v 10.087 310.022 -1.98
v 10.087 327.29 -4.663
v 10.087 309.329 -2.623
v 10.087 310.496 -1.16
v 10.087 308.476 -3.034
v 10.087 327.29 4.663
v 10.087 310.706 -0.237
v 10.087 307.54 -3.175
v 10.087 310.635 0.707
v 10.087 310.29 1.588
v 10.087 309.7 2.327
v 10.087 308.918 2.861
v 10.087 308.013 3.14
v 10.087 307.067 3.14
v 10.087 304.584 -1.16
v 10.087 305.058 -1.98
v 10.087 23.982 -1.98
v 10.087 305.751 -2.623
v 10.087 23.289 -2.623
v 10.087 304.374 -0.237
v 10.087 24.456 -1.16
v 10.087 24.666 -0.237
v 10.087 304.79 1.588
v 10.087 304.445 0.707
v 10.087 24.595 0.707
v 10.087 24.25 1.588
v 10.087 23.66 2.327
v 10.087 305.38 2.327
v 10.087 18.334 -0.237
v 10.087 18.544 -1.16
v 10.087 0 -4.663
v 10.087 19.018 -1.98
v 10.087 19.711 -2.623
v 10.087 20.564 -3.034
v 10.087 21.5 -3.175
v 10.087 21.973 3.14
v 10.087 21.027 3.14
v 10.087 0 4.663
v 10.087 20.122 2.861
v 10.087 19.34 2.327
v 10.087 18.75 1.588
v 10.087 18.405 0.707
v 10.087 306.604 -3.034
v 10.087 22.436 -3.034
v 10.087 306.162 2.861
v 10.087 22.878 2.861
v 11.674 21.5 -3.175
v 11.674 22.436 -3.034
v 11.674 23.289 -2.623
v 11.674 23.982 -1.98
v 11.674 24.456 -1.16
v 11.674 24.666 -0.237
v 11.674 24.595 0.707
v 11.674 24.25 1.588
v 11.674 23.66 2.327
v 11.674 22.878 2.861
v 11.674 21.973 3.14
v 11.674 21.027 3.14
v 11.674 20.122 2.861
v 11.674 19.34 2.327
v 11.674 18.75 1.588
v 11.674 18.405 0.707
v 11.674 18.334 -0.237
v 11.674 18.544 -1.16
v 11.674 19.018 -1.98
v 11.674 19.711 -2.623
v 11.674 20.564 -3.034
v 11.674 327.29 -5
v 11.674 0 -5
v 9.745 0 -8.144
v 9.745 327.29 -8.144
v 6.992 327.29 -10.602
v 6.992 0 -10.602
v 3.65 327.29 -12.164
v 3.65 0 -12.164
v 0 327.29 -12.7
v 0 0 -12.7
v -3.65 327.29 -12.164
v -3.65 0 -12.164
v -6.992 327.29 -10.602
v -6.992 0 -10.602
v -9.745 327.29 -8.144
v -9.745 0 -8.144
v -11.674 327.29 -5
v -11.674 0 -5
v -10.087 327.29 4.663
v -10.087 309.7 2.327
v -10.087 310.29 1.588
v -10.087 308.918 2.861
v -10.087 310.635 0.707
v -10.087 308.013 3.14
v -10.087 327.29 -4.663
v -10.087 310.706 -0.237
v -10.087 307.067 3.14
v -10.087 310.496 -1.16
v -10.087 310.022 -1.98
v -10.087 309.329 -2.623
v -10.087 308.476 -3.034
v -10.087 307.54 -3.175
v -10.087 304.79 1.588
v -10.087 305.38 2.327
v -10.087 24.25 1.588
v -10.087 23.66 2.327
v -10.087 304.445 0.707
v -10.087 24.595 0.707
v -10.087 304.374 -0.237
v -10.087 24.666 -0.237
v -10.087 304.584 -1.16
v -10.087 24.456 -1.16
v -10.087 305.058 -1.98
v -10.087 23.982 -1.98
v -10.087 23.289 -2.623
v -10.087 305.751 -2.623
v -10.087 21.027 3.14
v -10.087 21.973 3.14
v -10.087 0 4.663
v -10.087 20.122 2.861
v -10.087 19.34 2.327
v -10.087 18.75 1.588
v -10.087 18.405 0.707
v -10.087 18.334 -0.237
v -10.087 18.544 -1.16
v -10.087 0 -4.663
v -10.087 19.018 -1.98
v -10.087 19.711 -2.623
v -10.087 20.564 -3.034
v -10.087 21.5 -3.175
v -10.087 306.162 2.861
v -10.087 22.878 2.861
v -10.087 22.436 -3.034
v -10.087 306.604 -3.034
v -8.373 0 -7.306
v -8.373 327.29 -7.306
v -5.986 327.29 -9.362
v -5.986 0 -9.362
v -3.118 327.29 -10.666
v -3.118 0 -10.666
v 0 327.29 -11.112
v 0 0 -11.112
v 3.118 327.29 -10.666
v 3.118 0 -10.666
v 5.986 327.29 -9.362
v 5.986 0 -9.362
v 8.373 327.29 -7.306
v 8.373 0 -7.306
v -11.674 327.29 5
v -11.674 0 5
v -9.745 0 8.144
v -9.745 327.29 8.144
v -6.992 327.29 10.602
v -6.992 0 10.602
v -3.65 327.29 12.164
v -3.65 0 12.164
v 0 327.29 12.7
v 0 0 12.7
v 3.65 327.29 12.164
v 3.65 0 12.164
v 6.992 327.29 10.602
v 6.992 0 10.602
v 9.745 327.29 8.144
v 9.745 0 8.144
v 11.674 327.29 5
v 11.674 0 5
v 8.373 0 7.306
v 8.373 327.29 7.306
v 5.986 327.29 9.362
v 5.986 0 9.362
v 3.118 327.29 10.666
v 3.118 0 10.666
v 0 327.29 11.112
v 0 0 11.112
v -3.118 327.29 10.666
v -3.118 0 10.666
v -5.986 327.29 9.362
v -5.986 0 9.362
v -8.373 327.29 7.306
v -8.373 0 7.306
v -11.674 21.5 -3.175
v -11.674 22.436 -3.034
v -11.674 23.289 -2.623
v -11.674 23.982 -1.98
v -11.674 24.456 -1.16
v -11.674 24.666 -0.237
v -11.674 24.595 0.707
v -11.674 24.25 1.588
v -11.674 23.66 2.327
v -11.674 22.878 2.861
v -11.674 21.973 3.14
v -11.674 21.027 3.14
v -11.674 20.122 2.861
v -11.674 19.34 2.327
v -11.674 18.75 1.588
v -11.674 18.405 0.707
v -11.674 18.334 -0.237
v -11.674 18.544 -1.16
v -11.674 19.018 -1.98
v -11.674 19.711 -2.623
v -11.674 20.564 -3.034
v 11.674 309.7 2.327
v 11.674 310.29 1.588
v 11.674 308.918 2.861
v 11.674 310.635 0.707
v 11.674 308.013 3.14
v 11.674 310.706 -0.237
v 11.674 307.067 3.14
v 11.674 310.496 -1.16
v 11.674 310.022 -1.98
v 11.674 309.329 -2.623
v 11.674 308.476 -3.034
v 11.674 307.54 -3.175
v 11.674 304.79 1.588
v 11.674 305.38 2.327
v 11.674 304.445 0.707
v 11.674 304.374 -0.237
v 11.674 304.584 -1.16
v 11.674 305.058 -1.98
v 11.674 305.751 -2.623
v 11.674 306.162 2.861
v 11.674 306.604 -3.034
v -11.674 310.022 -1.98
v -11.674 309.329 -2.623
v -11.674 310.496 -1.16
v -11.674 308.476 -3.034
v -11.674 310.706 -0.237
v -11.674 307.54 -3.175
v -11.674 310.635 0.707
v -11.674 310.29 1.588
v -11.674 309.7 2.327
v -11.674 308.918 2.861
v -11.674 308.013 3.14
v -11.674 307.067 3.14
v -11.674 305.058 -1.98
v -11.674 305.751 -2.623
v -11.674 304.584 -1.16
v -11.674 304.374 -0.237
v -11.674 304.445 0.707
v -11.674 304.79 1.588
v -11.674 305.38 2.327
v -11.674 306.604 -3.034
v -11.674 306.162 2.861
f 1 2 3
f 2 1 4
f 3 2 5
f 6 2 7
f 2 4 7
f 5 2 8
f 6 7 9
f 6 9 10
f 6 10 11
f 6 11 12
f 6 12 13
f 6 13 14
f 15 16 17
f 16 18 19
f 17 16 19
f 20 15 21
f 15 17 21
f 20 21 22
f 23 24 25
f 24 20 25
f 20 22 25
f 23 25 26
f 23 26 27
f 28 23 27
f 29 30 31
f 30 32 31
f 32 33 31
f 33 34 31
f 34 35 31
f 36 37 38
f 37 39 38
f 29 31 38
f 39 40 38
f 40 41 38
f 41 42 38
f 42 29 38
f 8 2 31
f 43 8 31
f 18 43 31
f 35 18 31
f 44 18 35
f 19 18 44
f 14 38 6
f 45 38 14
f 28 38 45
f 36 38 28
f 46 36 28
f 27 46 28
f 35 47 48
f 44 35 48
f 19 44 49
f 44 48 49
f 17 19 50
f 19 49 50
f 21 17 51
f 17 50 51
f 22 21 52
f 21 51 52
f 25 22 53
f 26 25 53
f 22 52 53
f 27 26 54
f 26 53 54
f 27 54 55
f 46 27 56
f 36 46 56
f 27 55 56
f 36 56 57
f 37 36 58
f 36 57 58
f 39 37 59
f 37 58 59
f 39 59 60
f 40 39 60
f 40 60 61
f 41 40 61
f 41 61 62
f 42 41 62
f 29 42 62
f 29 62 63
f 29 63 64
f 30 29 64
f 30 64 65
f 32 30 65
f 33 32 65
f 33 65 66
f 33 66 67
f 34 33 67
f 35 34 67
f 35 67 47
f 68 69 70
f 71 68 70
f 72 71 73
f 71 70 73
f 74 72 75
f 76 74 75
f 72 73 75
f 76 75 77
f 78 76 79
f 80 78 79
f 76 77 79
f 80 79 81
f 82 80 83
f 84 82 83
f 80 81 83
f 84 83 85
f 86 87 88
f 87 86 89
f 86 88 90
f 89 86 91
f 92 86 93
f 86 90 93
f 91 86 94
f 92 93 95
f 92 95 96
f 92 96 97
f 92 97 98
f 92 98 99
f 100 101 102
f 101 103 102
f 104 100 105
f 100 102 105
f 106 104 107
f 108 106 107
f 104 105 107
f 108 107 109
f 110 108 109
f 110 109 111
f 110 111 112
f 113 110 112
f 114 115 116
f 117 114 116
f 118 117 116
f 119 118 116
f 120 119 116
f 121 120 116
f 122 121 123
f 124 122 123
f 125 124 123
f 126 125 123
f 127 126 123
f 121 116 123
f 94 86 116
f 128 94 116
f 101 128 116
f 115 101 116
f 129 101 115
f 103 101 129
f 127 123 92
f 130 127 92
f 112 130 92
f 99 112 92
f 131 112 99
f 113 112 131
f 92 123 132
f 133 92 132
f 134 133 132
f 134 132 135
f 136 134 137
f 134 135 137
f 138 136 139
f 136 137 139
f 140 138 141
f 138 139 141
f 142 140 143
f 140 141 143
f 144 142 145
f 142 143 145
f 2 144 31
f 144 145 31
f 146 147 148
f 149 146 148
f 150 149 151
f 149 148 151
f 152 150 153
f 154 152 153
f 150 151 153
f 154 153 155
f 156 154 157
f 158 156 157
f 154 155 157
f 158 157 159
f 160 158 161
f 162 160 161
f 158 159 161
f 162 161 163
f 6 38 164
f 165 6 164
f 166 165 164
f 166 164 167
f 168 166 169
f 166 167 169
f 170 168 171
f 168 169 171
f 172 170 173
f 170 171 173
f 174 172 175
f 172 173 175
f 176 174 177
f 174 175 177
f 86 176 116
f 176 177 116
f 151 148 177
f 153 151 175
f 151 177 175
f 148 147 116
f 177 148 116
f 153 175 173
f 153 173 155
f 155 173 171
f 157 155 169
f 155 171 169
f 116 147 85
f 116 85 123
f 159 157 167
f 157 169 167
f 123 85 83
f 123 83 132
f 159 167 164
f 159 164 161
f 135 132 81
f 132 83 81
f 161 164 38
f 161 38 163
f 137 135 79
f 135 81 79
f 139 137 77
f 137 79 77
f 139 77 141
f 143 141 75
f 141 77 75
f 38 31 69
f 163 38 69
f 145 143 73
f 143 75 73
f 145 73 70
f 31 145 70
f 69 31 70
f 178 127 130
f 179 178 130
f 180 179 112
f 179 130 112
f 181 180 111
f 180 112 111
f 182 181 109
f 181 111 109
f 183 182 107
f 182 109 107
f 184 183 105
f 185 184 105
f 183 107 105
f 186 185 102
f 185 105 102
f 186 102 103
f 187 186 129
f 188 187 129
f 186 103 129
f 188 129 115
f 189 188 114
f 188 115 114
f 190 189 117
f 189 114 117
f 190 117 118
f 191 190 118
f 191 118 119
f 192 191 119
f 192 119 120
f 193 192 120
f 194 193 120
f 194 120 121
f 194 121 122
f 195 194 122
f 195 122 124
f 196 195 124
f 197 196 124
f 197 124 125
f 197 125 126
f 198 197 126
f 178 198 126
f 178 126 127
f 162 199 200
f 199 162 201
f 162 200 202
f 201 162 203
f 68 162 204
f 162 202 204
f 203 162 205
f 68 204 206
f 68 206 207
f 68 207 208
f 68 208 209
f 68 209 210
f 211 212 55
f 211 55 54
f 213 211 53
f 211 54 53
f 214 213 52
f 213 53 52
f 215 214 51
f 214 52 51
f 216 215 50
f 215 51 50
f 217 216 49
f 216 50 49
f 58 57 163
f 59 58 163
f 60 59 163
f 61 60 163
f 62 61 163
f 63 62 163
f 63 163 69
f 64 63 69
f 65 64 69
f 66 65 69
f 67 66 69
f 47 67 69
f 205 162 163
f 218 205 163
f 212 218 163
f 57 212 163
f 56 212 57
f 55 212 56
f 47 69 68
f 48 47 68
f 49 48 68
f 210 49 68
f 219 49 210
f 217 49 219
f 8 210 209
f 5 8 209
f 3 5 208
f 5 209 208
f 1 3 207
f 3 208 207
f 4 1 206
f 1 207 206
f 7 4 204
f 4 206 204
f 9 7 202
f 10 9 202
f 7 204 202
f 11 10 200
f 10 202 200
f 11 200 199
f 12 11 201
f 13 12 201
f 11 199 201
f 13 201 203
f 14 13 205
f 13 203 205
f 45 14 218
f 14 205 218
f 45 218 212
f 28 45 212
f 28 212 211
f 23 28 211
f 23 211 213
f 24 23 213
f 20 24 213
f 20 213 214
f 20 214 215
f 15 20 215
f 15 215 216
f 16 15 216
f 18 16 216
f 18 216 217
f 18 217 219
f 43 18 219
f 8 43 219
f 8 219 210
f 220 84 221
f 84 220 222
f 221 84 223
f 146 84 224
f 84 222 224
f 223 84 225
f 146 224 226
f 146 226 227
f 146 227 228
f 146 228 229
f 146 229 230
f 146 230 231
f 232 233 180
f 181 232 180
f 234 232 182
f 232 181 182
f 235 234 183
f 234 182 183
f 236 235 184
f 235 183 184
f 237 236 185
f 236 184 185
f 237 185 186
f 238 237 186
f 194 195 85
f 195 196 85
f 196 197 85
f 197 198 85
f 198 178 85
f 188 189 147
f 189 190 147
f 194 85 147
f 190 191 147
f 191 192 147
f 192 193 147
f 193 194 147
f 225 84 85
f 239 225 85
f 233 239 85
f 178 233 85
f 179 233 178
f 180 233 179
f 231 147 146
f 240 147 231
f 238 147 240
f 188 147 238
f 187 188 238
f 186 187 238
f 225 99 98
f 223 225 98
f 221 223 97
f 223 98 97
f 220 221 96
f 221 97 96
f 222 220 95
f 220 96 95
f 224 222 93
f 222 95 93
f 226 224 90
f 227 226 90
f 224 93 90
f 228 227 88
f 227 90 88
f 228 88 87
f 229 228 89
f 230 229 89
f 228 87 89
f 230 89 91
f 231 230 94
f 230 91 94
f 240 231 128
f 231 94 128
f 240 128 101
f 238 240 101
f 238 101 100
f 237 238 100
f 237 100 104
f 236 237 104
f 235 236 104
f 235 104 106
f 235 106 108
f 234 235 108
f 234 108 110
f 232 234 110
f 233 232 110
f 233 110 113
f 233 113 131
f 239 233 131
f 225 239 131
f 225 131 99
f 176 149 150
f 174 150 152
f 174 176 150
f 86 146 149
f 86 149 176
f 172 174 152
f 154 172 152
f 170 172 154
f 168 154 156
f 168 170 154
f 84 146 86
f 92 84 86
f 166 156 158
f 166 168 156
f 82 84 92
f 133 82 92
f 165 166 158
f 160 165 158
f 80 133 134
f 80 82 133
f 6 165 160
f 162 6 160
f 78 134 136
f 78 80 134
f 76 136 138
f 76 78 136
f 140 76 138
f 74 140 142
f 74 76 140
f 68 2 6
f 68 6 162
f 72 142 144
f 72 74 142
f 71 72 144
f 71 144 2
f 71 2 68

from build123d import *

# Parameters (mm, degrees)
BOSS_EXTRUDE1_DEPTH = 327.29
CUT_EXTRUDE1_REACH  = 330.367
SKETCH2_R           = 3.175


with BuildPart() as part:
    # Sketch1 → Boss-Extrude1 (new body)
    with BuildSketch(Plane(origin=(0, 0, 0), x_dir=(1, 0, 0), z_dir=(0, 1, 0))):
        with BuildLine():
            Line((11.674330816, -5), (11.674330816, 5))
            ThreePointArc((11.674330816, 5), (0, 12.7), (-11.674330816, 5))
            Line((-11.674330816, 5), (-11.674330816, -5))
            ThreePointArc((-11.674330816, -5), (0, -12.7), (11.674330816, -5))
        make_face()
        with BuildLine():
            Line((10.086830816, 4.662992638), (10.086830816, -4.662992638))
            ThreePointArc((10.086830816, -4.662992638), (0, -11.1125), (-10.086830816, -4.662992638))
            Line((-10.086830816, -4.662992638), (-10.086830816, 4.662992638))
            ThreePointArc((-10.086830816, 4.662992638), (0, 11.1125), (10.086830816, 4.662992638))
        make_face(mode=Mode.SUBTRACT)
    extrude(amount=BOSS_EXTRUDE1_DEPTH)

    # Cut-Extrude1: up to this face of the body (flat: up to its plane)
    cut_extrude1_end = Plane(part.part.faces().sort_by_distance((-11.674330816, 163.645, 0))[0])
    # Sketch2 → Cut-Extrude1 (cut, up to the picked face)
    with BuildSketch(Plane(origin=(11.674330816, 0, 0), x_dir=(0, 0, -1), z_dir=(1, 0, 0)), mode=Mode.PRIVATE) as cut_extrude1_sk1:
        with Locations((0, 21.5)):
            Circle(SKETCH2_R)
    cut_extrude1_tool1 = split(extrude(cut_extrude1_sk1.sketch, amount=-CUT_EXTRUDE1_REACH, mode=Mode.PRIVATE), bisect_by=cut_extrude1_end, keep=Keep.BOTH, mode=Mode.PRIVATE)
    # Sketch2 → Cut-Extrude1 (cut, up to the picked face)
    with BuildSketch(Plane(origin=(11.674330816, 0, 0), x_dir=(0, 0, -1), z_dir=(1, 0, 0)), mode=Mode.PRIVATE) as cut_extrude1_sk2:
        with Locations((0, 307.54)):
            Circle(SKETCH2_R)
    cut_extrude1_tool2 = split(extrude(cut_extrude1_sk2.sketch, amount=-CUT_EXTRUDE1_REACH, mode=Mode.PRIVATE), bisect_by=cut_extrude1_end, keep=Keep.BOTH, mode=Mode.PRIVATE)
    add(cut_extrude1_tool1.solids().sort_by(Axis((11.674331, 21.5, 0), (-1, 0, 0)))[0], mode=Mode.SUBTRACT)
    add(cut_extrude1_tool2.solids().sort_by(Axis((11.674331, 307.54, 0), (-1, 0, 0)))[0], mode=Mode.SUBTRACT)


solid = part.part
